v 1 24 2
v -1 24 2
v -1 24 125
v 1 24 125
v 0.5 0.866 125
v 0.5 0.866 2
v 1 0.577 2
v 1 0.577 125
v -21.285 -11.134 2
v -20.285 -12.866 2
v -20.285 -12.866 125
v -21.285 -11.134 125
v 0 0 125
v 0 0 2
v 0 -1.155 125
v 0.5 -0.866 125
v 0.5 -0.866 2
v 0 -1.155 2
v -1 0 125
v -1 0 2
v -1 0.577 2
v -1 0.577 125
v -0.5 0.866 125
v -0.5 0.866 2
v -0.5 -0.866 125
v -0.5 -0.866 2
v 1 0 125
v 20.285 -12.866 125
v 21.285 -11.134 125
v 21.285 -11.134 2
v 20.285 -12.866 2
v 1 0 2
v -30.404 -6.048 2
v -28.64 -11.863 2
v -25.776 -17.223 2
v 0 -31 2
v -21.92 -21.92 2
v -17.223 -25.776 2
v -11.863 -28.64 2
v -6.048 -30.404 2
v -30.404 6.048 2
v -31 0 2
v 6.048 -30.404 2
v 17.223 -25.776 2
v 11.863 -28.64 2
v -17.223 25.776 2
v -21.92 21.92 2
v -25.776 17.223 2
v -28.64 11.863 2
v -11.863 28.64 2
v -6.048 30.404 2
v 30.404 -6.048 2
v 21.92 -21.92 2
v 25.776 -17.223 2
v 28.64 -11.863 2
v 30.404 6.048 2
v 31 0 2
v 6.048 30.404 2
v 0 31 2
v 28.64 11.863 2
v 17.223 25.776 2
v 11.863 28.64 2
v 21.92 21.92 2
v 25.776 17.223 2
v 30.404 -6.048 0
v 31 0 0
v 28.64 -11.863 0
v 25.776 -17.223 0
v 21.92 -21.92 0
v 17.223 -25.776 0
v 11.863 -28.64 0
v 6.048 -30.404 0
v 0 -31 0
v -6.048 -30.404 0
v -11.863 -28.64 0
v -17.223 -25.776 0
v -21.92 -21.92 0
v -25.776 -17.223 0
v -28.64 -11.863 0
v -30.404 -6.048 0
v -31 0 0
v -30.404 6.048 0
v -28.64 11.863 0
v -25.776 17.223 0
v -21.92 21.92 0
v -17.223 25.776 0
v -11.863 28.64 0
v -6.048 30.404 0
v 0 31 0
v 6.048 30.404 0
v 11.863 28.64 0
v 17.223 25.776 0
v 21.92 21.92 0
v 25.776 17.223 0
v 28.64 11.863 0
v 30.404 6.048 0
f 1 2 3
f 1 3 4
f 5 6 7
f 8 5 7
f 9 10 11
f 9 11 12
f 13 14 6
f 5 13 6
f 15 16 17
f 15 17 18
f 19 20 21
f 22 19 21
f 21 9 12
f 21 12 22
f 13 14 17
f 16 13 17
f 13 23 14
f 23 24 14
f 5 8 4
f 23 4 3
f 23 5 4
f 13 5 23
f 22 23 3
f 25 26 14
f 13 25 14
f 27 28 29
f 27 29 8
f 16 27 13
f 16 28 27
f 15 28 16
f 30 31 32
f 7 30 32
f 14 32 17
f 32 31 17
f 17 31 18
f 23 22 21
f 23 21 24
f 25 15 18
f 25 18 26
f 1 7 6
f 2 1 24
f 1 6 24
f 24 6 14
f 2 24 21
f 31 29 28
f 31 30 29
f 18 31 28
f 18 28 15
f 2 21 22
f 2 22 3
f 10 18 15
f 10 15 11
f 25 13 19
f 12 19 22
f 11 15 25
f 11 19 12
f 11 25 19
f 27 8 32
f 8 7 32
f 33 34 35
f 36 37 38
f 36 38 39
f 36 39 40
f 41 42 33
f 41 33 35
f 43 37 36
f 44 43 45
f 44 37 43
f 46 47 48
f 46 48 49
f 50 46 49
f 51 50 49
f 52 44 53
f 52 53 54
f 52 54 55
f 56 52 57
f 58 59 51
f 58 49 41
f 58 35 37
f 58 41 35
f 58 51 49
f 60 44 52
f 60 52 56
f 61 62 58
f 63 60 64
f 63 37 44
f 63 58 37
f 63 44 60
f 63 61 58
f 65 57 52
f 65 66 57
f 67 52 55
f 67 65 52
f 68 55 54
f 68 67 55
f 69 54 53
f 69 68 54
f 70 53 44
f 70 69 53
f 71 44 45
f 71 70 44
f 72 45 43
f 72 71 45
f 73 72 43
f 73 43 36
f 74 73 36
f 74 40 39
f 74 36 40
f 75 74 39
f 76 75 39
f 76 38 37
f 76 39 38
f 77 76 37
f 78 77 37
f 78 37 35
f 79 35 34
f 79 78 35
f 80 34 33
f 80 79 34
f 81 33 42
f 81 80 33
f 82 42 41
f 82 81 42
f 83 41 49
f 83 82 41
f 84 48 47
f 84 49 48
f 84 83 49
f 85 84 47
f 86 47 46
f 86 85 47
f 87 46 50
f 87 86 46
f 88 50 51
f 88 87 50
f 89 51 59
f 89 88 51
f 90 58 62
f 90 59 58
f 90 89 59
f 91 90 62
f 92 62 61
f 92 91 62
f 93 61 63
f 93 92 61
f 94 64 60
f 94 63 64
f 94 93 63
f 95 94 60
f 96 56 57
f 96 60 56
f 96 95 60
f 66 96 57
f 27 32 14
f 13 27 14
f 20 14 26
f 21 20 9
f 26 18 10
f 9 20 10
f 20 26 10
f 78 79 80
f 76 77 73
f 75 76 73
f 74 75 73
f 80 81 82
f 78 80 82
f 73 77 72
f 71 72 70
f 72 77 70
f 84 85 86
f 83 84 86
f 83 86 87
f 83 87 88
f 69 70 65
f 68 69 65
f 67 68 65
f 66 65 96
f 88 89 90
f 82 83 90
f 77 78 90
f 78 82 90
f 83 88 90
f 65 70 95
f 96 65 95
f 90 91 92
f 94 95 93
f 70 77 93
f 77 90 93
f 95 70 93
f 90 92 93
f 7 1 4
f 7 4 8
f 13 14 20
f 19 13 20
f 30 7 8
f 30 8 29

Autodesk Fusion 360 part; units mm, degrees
sketch "Sketch1" plane through (0, 0, 0) normal (0, 0, 1) x (1, 0, 0)
  circle A0 centre (0, 0) radius 31
  dimension "d1" = 62
extrude "Extrude1" add sketch "Sketch1" along normal blind 2 makes body 1
sketch "Sketch2" plane through (0, 0, 2) normal (0, 0, 1) x (-1, 0, 0)
  circle A0 centre (0, 0) radius 31
  line L0 (-1, 0) -> (1, 0)
  line L1 (1, 0) -> (1, -24)
  line L2 (1, -24) -> (-1, -24)
  line L3 (-1, -24) -> (-1, 0)
  line L4 (21.2846, 11.134) -> (0.5, -0.866)
  line L5 (20.2846, 12.866) -> (21.2846, 11.134)
  line L6 (-0.5, 0.866) -> (20.2846, 12.866)
  line L7 (0.5, -0.866) -> (-0.5, 0.866)
  line L8 (-20.2846, 12.866) -> (0.5, 0.866)
  line L9 (-21.2846, 11.134) -> (-20.2846, 12.866)
  line L10 (-0.5, -0.866) -> (-21.2846, 11.134)
  line L11 (0.5, 0.866) -> (-0.5, -0.866)
  dimension "d7" = 360
extrude "Extrude2" add sketch "Sketch2" along normal blind 123 separate body contours L0 L3 L6 L7 L8 L9 L10 | L0 L1 L4 L5 L6 L8 L11 | L1 L2 L3 L4 L7 L10 L11 makes body 2 at (-6.7615, -5.0585, 43)
